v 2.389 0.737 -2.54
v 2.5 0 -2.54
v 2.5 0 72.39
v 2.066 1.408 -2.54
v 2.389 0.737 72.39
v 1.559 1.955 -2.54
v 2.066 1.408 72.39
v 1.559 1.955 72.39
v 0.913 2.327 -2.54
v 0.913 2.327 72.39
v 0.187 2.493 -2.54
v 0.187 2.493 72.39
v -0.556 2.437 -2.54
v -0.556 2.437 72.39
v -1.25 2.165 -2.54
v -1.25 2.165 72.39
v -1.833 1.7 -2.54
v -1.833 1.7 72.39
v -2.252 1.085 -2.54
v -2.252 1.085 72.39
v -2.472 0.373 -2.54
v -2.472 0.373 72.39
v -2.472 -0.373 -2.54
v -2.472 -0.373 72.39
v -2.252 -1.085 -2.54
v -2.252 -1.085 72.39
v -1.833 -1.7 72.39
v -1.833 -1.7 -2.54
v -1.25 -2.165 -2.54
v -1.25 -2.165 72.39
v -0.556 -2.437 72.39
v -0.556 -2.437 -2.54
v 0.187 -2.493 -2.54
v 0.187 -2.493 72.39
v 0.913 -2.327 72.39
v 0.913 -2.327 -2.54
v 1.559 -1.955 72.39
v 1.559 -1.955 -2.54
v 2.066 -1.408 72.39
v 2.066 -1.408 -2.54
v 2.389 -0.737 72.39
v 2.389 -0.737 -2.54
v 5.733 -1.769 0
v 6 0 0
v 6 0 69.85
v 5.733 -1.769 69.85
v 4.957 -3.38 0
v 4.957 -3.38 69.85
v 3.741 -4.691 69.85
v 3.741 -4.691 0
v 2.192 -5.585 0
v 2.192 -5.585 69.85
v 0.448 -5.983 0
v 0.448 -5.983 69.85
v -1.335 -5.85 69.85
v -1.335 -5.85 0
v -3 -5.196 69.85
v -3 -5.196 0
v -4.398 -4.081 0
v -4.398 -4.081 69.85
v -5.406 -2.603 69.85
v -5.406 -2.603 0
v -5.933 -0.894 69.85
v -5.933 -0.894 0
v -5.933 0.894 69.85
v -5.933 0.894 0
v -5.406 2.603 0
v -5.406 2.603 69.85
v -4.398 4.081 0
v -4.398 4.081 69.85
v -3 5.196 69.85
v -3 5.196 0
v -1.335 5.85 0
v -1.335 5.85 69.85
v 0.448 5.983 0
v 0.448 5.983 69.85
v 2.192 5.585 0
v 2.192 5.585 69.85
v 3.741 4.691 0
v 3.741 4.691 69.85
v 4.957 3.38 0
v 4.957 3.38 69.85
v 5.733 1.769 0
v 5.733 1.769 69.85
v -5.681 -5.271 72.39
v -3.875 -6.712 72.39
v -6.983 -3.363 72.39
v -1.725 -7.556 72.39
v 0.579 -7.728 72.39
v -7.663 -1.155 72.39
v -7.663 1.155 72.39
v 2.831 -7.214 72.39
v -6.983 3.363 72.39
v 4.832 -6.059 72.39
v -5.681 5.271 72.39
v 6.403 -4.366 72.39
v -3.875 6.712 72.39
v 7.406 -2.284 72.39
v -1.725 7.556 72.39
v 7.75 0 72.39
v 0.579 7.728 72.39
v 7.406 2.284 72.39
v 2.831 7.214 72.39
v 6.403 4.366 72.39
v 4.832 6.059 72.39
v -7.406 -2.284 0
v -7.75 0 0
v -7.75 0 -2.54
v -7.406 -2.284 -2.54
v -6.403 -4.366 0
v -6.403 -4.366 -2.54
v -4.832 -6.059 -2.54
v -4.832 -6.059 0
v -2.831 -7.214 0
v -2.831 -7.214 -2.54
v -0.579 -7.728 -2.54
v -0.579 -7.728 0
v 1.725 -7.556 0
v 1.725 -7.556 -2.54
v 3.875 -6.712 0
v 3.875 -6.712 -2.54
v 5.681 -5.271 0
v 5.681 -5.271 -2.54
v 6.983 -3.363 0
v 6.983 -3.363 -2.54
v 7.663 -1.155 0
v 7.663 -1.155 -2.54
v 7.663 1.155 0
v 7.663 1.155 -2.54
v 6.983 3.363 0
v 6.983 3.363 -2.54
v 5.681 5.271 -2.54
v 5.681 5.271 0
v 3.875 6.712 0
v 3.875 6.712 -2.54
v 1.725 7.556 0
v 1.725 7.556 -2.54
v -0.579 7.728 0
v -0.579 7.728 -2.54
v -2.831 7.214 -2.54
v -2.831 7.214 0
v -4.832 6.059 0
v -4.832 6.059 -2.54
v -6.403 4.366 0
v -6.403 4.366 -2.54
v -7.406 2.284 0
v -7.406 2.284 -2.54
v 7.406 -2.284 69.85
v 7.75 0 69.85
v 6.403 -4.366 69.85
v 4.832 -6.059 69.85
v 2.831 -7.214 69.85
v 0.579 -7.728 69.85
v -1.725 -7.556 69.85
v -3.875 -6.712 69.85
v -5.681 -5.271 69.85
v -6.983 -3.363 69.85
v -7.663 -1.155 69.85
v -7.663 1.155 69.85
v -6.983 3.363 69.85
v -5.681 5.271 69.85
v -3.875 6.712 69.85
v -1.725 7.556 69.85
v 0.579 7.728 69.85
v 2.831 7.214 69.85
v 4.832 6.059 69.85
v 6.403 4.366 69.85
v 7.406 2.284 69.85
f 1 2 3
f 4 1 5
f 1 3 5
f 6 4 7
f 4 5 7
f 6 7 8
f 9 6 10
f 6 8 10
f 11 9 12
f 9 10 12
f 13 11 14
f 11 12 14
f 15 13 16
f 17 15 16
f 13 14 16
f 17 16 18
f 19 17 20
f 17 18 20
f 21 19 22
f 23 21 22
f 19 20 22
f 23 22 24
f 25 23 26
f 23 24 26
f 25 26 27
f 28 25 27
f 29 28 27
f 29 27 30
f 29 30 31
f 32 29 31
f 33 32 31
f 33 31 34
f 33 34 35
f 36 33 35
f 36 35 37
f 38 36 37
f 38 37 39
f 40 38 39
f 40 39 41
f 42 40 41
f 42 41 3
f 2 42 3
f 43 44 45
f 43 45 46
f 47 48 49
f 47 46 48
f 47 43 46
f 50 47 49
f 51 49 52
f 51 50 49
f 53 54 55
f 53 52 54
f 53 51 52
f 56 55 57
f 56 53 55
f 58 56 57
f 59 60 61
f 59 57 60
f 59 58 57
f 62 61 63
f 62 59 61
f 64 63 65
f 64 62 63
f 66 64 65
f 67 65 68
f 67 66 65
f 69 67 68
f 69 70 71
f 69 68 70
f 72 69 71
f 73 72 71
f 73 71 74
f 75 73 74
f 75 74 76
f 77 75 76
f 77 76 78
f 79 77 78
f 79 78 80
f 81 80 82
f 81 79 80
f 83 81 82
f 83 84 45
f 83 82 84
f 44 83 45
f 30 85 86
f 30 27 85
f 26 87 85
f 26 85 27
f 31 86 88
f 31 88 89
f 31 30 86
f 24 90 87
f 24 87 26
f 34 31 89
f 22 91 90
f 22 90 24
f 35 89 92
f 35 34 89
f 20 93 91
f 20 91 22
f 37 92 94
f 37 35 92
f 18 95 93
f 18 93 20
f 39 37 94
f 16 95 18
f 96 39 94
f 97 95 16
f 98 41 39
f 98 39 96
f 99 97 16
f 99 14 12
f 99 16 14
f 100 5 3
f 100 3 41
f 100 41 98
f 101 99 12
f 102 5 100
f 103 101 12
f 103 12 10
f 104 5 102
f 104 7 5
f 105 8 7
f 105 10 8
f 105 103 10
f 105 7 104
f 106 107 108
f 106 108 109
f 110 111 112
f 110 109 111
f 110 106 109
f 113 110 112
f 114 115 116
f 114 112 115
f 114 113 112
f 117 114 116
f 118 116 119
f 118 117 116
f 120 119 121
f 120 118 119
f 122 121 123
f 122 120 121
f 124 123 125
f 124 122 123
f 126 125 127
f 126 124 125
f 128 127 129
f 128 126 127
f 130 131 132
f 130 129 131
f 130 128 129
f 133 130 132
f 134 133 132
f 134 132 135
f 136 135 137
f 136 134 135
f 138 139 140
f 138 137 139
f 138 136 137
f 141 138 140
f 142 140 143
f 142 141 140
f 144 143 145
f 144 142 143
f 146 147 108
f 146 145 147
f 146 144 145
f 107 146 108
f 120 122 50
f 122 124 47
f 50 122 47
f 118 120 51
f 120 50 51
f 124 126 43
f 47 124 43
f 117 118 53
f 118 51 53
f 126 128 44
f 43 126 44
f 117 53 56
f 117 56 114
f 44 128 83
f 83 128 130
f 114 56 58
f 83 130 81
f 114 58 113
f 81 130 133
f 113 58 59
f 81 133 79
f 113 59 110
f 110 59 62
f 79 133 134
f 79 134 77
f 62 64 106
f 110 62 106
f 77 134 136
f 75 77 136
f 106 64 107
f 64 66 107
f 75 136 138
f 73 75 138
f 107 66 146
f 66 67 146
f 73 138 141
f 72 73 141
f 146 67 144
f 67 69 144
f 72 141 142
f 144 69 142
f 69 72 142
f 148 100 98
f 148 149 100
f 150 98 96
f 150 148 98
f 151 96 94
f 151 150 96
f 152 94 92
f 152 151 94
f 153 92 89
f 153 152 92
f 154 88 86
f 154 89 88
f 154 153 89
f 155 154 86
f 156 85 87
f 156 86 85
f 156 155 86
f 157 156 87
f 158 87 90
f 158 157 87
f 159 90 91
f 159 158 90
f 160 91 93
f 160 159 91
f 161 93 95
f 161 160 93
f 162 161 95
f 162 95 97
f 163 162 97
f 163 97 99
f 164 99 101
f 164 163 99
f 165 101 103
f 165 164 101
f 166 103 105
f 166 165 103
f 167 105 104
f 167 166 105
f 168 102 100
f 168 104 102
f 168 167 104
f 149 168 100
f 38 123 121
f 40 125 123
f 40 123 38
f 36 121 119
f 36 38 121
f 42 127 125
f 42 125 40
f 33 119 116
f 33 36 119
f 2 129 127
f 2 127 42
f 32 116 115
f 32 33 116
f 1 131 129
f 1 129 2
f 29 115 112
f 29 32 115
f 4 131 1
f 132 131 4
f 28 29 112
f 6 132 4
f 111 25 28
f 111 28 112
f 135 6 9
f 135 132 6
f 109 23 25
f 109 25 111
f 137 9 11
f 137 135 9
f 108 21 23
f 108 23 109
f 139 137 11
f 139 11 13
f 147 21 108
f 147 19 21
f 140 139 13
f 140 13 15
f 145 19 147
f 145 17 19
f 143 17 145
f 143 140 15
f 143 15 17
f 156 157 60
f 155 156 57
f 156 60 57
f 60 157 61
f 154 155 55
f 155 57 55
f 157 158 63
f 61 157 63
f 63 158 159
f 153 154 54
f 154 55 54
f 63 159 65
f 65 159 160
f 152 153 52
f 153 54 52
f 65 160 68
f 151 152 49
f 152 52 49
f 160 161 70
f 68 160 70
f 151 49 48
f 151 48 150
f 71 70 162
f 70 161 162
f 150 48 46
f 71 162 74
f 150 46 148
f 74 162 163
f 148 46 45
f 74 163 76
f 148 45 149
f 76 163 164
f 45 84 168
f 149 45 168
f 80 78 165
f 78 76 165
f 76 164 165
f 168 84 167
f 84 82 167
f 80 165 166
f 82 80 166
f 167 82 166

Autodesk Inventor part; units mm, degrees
ref_plane "YZ Plane" through (0, 0, 0) normal (1, 0, 0) x (0, 1, 0)
ref_plane "XZ Plane" through (0, 0, 0) normal (0, 1, 0) x (-1, 0, 0)
ref_plane "XY Plane" through (0, 0, 0) normal (0, 0, 1) x (1, 0, 0)
sketch "Sketch1" plane through (0, 0, 0) normal (0, 0, 1) x (1, 0, 0)
  circle A0 centre (0, 0) radius 6
  dimension "d0" = 12
extrude "Extrusion1" add sketch "Sketch1" along normal blind 69.85
sketch "Sketch2" plane through (0, 0, 69.85) normal (0, 0, 1) x (1, 0, 0)
  circle A0 centre (0, 0) radius 7.75
  dimension "d3" = 15.5
extrude "Extrusion2" add sketch "Sketch2" along normal blind 2.54
sketch "Sketch3" plane through (0, 0, 0) normal (0, 0, -1) x (-1, 0, 0)
  circle A0 centre (0, 0) radius 7.75
  dimension "d6" = 15.5
extrude "Extrusion3" add sketch "Sketch3" along normal blind 2.54
sketch "Sketch4" plane through (0, 0, 72.39) normal (0, 0, 1) x (1, 0, 0)
  circle A0 centre (0, 0) radius 2.5
  dimension "d9" = 5
extrude "Extrusion4" cut sketch "Sketch4" against normal blind 127
properties part number "SteelSpoolBar"
